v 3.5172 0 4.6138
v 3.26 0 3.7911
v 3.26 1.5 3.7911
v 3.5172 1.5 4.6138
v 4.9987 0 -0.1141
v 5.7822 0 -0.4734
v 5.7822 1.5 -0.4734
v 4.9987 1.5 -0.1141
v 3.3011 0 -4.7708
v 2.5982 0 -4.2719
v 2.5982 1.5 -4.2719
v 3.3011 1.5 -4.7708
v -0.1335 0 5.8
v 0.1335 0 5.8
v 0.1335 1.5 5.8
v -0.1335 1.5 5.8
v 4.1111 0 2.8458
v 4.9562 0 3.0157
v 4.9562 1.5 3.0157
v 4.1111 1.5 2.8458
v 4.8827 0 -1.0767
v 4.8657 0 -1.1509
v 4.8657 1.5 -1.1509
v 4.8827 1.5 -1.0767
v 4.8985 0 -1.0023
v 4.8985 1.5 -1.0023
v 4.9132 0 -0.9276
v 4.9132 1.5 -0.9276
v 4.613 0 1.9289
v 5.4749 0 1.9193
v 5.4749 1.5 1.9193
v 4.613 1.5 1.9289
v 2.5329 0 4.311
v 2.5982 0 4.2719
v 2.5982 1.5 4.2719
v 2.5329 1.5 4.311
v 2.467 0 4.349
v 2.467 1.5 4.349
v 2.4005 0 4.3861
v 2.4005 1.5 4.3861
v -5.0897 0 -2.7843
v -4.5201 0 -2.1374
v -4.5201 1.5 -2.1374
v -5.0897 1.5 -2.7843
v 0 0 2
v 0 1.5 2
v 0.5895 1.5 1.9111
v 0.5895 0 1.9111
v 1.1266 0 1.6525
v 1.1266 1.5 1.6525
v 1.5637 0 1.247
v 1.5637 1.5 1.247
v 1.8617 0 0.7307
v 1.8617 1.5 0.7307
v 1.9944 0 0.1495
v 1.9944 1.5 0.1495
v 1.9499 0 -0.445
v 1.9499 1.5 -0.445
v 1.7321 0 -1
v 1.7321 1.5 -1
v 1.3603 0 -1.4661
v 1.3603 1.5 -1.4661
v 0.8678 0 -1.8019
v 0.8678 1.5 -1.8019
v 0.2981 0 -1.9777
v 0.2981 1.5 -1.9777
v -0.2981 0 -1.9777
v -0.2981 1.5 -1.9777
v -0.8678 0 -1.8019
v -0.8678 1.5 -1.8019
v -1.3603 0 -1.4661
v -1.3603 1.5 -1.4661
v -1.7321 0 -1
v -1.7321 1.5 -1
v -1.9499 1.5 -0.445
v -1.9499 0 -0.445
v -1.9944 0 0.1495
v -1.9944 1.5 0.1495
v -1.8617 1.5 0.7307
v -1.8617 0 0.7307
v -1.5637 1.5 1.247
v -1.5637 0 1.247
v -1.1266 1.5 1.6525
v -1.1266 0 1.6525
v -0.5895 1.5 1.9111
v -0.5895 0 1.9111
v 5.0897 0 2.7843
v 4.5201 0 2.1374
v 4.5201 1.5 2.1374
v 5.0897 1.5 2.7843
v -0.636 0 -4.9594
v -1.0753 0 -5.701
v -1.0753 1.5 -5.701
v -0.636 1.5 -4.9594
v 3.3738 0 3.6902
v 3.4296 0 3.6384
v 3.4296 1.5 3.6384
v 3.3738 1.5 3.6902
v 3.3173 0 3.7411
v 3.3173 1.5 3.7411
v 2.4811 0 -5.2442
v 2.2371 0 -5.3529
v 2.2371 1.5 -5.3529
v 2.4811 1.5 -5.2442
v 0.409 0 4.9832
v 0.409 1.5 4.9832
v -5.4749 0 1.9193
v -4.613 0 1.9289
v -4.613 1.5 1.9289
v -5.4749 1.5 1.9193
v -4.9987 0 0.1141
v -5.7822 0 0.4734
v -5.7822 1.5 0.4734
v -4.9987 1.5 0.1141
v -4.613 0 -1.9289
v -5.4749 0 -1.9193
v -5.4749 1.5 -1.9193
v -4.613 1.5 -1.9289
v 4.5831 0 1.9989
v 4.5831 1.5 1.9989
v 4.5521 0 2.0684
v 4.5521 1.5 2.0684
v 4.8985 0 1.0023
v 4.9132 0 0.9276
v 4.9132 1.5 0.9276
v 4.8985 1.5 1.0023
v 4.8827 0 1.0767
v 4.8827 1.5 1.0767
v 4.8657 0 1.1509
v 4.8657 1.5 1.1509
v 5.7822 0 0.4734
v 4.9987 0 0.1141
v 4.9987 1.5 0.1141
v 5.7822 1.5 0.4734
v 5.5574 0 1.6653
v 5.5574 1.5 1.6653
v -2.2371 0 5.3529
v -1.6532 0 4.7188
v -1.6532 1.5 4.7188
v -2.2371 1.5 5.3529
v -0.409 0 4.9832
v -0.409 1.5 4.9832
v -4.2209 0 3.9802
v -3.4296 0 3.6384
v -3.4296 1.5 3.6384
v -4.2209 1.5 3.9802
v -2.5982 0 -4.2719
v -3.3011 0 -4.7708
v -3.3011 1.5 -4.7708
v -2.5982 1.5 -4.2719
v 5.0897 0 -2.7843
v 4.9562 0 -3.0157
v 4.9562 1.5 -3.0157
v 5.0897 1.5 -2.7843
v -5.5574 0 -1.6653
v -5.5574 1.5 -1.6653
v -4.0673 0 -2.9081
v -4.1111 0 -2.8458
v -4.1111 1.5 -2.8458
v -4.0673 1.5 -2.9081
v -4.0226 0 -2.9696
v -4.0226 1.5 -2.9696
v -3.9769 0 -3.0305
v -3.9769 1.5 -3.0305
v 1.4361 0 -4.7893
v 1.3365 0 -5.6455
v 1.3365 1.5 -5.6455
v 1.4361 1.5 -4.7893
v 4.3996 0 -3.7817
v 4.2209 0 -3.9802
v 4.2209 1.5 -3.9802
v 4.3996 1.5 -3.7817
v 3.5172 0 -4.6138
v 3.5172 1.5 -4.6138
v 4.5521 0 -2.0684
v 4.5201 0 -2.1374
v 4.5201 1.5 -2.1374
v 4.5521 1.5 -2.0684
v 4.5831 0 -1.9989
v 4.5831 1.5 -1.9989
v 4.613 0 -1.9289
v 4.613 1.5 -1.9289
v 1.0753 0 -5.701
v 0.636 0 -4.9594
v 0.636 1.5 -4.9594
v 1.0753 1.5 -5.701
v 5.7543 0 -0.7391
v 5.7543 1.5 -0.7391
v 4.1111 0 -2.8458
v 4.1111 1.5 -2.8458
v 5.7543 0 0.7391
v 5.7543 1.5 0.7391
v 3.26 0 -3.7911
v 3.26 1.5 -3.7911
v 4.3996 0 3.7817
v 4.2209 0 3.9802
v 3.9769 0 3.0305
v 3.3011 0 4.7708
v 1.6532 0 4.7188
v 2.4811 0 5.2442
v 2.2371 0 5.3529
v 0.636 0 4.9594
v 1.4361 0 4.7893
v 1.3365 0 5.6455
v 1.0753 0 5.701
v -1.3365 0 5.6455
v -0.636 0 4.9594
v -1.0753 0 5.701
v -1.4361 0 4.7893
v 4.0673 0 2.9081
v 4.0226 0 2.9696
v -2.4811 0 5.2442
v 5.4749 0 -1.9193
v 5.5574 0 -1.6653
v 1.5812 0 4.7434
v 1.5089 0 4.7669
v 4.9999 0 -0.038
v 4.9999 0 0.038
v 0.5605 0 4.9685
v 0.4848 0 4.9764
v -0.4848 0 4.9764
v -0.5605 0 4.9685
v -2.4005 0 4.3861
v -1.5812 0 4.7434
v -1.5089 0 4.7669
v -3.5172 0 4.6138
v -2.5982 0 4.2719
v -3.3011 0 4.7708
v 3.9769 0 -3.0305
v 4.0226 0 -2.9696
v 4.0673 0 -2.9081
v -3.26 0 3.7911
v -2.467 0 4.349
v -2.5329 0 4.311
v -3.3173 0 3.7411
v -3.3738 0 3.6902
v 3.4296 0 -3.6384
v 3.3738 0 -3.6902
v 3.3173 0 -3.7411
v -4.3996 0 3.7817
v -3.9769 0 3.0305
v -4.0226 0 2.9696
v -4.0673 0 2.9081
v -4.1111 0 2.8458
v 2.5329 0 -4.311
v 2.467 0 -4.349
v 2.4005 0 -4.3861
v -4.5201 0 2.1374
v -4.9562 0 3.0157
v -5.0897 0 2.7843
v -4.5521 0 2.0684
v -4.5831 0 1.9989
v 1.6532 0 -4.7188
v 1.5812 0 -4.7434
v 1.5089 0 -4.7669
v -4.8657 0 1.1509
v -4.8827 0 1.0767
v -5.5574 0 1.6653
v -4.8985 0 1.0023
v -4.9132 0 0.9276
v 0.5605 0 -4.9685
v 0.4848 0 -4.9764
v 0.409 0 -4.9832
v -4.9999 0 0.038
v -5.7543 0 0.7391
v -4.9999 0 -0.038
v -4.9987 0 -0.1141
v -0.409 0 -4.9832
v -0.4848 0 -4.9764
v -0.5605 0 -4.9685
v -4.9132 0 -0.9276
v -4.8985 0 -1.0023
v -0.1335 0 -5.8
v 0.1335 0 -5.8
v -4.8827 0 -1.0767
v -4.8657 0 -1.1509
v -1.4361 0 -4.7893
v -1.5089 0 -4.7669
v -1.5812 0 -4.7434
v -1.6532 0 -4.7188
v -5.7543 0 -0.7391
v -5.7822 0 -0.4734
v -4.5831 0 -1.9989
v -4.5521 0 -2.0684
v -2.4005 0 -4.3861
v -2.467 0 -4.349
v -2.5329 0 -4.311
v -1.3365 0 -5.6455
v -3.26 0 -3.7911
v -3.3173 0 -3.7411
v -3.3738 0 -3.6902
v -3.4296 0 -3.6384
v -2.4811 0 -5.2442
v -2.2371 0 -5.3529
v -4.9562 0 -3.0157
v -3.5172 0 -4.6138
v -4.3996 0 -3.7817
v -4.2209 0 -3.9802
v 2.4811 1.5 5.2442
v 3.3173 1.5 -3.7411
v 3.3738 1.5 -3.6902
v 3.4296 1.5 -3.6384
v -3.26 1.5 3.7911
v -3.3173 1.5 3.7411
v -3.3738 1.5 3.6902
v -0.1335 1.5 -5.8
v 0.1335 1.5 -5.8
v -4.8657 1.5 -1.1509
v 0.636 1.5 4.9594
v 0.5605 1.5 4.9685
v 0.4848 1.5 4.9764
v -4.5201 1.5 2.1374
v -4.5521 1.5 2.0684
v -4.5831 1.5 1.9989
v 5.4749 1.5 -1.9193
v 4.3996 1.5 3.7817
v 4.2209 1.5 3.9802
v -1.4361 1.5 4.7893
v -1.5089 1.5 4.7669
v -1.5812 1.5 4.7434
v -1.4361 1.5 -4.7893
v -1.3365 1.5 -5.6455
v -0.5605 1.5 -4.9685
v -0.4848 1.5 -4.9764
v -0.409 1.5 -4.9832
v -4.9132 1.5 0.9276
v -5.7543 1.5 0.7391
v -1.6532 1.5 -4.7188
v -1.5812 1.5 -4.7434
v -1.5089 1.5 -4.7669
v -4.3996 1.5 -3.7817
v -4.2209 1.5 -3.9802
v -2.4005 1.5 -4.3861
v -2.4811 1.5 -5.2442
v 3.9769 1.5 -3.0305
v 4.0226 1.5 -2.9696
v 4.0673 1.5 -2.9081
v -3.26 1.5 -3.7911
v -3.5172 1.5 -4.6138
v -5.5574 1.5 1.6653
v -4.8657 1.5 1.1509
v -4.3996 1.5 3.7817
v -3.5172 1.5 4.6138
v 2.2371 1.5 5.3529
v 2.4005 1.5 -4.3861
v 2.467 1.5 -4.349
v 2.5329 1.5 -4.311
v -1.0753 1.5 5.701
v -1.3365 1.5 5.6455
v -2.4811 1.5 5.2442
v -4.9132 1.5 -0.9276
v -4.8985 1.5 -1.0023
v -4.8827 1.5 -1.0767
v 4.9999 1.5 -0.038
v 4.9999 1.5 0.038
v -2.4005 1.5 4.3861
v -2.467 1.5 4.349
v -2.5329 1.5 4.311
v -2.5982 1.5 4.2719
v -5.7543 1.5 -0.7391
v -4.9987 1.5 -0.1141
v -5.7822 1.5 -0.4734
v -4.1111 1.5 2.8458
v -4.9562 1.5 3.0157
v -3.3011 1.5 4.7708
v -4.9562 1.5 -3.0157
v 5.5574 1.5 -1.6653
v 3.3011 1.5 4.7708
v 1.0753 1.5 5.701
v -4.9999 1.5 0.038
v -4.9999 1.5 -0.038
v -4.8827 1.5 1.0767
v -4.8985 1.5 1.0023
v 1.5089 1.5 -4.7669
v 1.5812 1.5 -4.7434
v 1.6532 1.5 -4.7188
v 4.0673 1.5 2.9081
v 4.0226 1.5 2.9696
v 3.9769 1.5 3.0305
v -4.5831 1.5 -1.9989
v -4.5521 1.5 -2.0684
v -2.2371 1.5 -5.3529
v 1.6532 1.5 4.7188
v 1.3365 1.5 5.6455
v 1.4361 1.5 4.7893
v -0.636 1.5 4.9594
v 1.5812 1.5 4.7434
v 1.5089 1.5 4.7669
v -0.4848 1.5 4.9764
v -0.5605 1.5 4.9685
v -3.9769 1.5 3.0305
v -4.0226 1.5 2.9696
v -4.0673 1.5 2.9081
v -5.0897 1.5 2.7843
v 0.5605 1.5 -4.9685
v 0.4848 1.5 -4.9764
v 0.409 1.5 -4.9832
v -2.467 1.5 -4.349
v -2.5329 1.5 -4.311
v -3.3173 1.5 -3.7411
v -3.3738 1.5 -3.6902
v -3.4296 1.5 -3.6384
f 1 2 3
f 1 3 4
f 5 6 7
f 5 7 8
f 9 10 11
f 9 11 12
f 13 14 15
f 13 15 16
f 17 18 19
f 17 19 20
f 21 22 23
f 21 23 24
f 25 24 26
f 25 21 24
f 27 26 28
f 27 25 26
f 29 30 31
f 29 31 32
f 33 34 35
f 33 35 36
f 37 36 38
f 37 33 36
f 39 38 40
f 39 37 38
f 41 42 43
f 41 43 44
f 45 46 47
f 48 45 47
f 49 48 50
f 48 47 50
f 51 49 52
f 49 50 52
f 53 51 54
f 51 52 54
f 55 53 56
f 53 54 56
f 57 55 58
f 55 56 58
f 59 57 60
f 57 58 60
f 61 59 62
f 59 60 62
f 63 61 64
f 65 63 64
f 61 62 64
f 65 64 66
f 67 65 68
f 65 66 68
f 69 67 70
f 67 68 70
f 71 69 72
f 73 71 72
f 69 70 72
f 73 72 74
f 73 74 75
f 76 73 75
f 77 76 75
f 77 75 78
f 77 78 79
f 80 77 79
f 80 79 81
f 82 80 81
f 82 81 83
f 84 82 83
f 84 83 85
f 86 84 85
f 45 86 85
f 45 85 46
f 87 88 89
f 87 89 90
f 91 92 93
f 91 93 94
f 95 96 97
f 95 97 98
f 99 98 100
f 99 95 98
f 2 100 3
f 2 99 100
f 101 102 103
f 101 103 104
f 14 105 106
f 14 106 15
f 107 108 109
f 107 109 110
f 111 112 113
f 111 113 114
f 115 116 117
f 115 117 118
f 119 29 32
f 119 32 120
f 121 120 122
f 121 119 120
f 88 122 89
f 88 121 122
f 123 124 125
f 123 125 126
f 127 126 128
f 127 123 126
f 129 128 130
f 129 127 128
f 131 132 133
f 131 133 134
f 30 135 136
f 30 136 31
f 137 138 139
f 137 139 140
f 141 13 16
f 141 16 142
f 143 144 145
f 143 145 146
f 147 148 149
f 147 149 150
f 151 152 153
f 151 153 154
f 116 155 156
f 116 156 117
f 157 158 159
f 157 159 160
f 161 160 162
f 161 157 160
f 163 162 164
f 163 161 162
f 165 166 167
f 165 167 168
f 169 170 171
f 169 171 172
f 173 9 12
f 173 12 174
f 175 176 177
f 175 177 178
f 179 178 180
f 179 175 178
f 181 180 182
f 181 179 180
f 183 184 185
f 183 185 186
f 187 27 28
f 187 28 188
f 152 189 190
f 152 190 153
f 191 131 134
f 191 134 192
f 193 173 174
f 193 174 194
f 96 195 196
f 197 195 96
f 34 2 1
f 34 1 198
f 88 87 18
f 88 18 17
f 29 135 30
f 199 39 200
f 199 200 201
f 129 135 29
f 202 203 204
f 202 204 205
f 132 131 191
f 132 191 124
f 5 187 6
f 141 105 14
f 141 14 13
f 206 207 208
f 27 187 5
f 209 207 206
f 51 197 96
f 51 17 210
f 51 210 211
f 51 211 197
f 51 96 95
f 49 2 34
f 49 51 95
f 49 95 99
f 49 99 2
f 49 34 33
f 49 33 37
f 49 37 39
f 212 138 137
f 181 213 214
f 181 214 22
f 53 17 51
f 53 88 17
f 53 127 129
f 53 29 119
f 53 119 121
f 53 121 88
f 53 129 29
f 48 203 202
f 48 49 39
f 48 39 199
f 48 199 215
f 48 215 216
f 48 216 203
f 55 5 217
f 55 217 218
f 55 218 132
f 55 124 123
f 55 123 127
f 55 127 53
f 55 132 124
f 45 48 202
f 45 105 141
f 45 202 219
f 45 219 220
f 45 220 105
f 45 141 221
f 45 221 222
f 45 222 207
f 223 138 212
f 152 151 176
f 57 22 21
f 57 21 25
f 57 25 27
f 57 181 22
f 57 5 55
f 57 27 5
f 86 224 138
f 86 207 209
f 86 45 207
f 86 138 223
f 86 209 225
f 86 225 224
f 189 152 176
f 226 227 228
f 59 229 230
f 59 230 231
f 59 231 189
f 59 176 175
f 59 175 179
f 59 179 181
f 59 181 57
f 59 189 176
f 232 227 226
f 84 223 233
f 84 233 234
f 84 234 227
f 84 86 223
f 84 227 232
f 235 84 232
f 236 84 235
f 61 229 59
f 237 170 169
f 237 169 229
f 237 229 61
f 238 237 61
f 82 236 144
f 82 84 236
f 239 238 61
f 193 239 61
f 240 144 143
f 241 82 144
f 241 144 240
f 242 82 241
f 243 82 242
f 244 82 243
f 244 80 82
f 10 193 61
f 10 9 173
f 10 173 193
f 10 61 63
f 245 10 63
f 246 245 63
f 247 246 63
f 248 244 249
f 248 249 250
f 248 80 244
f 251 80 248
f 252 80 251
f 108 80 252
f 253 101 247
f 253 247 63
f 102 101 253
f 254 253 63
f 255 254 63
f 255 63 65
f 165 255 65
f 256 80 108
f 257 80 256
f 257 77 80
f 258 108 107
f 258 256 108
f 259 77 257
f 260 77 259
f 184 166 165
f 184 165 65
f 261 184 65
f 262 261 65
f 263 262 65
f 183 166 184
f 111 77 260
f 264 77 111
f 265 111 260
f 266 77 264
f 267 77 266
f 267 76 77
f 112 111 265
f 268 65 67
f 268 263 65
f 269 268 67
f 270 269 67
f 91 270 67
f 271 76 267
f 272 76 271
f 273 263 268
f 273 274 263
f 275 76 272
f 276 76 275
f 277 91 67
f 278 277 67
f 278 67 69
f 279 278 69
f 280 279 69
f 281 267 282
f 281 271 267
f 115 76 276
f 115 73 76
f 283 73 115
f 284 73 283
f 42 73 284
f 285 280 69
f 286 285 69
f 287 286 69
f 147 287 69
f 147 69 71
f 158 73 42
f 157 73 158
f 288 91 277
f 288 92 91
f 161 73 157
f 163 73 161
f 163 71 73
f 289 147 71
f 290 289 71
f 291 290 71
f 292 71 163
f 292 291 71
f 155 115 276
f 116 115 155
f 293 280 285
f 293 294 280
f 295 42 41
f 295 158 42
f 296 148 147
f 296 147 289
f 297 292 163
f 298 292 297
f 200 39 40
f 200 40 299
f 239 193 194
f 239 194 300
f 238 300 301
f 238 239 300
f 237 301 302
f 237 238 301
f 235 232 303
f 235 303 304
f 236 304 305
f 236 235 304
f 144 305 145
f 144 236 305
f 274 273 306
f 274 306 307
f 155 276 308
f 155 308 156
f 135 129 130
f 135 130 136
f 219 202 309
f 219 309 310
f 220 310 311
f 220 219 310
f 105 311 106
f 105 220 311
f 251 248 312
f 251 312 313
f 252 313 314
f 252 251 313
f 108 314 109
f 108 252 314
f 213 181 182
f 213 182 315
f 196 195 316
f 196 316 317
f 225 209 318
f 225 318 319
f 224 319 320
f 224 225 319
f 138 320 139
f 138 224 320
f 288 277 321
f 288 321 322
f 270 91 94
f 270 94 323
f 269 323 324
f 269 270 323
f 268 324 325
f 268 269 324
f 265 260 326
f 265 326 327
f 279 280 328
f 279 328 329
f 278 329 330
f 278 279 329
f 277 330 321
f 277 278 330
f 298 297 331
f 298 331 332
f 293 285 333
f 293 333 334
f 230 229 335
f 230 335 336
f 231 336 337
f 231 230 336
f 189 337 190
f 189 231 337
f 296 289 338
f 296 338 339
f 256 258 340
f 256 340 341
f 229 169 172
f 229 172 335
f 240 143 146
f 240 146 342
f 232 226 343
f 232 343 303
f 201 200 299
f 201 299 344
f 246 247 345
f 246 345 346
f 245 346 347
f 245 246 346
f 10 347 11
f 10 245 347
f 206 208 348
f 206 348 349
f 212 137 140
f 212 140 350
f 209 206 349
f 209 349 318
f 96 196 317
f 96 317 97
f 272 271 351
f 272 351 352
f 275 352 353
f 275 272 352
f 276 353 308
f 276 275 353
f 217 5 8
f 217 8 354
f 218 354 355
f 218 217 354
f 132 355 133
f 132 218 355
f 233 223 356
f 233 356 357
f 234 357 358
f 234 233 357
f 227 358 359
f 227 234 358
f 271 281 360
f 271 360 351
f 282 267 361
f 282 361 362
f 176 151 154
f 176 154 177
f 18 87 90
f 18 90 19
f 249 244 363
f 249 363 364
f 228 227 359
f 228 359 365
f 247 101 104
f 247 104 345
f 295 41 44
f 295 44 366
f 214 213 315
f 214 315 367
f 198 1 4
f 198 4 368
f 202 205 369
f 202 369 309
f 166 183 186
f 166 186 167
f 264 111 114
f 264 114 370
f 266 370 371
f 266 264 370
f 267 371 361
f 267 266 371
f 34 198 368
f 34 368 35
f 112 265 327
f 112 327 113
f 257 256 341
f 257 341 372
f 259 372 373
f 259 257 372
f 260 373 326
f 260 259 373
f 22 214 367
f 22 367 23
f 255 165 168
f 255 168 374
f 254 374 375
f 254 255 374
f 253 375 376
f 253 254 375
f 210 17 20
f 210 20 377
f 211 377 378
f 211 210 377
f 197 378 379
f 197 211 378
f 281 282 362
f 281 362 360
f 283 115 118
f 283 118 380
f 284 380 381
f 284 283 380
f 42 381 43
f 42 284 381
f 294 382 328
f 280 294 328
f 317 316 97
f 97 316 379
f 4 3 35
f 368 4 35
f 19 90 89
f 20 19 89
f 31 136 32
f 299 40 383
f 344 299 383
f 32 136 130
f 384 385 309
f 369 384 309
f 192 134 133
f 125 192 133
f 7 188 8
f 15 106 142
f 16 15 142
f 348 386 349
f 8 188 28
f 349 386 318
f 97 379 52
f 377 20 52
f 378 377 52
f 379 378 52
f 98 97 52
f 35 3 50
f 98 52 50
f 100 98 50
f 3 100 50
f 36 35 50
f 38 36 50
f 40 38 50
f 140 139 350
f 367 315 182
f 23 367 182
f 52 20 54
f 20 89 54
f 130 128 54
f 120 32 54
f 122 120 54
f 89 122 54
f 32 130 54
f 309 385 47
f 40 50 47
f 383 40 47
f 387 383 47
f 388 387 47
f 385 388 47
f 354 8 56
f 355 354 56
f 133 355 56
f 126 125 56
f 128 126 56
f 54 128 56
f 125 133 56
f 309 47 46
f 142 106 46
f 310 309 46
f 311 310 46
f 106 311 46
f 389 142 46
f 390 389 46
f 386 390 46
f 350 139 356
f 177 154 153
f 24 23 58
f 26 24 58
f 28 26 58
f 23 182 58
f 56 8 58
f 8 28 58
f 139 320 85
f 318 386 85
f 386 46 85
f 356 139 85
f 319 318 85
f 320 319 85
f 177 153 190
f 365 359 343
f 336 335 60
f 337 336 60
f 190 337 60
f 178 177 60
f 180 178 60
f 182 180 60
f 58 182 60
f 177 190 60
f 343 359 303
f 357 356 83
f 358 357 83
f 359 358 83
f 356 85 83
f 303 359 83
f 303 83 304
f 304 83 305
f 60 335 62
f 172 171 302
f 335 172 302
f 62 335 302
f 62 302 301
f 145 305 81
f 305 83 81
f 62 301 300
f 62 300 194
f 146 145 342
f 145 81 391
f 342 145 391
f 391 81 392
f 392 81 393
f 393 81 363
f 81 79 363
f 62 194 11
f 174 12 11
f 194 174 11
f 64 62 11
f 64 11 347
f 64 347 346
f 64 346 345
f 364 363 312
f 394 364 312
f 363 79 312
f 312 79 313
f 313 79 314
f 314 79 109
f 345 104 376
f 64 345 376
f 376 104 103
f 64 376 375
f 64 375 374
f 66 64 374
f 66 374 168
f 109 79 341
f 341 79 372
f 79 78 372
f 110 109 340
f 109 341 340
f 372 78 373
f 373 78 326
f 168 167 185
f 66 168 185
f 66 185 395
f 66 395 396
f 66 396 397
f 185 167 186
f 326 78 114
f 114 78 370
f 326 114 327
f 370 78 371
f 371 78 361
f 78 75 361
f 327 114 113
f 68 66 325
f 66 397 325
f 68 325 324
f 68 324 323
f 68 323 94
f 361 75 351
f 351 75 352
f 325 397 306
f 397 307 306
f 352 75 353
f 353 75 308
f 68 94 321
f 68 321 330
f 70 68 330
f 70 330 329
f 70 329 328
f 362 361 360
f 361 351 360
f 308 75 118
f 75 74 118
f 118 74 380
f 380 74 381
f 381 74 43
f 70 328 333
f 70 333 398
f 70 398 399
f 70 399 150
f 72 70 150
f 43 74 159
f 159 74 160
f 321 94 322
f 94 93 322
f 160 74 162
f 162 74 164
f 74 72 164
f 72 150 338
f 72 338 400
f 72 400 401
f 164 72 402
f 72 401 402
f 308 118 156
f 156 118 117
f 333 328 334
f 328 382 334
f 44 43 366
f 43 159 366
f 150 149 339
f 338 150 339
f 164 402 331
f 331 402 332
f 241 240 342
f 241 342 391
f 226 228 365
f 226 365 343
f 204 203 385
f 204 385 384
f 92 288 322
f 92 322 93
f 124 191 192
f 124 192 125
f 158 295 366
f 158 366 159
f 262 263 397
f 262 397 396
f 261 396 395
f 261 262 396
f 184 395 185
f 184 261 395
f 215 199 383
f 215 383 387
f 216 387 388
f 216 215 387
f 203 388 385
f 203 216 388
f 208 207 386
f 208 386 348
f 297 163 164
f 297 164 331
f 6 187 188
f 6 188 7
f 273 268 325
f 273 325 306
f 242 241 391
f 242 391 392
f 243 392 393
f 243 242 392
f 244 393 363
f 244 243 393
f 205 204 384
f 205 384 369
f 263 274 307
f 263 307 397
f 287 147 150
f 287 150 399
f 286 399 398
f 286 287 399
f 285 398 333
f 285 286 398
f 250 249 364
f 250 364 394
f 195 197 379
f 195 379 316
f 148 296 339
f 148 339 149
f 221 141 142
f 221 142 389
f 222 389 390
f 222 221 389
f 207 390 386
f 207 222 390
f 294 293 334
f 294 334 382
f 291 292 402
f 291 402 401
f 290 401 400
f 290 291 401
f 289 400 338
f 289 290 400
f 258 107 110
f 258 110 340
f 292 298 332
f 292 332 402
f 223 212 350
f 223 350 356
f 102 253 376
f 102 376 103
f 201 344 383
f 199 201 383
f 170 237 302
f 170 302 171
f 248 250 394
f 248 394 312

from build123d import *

# Parameters (mm, degrees)
BOSS_EXTRUDE1_DEPTH = 1.5
SKETCH2_R           = 2
CUT_EXTRUDE1_DEPTH  = 9.326084366


with BuildPart() as part:
    # Sketch1 → Boss-Extrude1 (new body)
    with BuildSketch(Plane(origin=(0, 0, 0), x_dir=(1, 0, 0), z_dir=(0, 1, 0))):
        with BuildLine():
            Line((-0.133547548, 5.8), (0.133547548, 5.8))
            Line((0.133547548, 5.8), (0.408993174, 4.983244383))
            ThreePointArc((0.408993174, 4.983244383), (0.522642316, 4.972609477), (0.636019074, 4.959383))
            Line((0.636019074, 4.959383), (1.075258593, 5.701022181))
            Line((1.075258593, 5.701022181), (1.33651702, 5.645489988))
            Line((1.33651702, 5.645489988), (1.436130457, 4.789314075))
            ThreePointArc((1.436130457, 4.789314075), (1.545084972, 4.755282581), (1.653234236, 4.718772781))
            Line((1.653234236, 4.718772781), (2.237070774, 5.352882336))
            Line((2.237070774, 5.352882336), (2.481074286, 5.244244973))
            Line((2.481074286, 5.244244973), (2.400501948, 4.38606776))
            ThreePointArc((2.400501948, 4.38606776), (2.5, 4.330127019), (2.598195129, 4.271929549))
            Line((2.598195129, 4.271929549), (3.301112228, 4.770795846))
            Line((3.301112228, 4.770795846), (3.517196699, 4.613801288))
            Line((3.517196699, 4.613801288), (3.259959985, 3.791129237))
            ThreePointArc((3.259959985, 3.791129237), (3.345653032, 3.715724127), (3.429602427, 3.638382497))
            Line((3.429602427, 3.638382497), (4.220879236, 3.980202686))
            Line((4.220879236, 3.980202686), (4.399600739, 3.781712348))
            Line((4.399600739, 3.781712348), (3.976942128, 3.030500175))
            ThreePointArc((3.976942128, 3.030500175), (4.045084972, 2.938926261), (4.111119642, 2.84582067))
            Line((4.111119642, 2.84582067), (4.956173568, 3.015655569))
            Line((4.956173568, 3.015655569), (5.089721116, 2.784344431))
            Line((5.089721116, 2.784344431), (4.520112816, 2.137423713))
            ThreePointArc((4.520112816, 2.137423713), (4.567727288, 2.033683215), (4.612961202, 1.928882825))
            Line((4.612961202, 1.928882825), (5.474859333, 1.919309833))
            Line((5.474859333, 1.919309833), (5.557396256, 1.665287302))
            Line((5.557396256, 1.665287302), (4.865732884, 1.150931578))
            ThreePointArc((4.865732884, 1.150931578), (4.890738004, 1.039558454), (4.913194221, 0.927643544))
            Line((4.913194221, 0.927643544), (5.754267473, 0.739081047))
            Line((5.754267473, 0.739081047), (5.782186513, 0.473449127))
            Line((5.782186513, 0.473449127), (4.998697077, 0.114138211))
            ThreePointArc((4.998697077, 0.114138211), (5, 0), (4.998697077, -0.114138211))
            Line((4.998697077, -0.114138211), (5.782186513, -0.473449127))
            Line((5.782186513, -0.473449127), (5.754267473, -0.739081047))
            Line((5.754267473, -0.739081047), (4.913194221, -0.927643544))
            ThreePointArc((4.913194221, -0.927643544), (4.890738004, -1.039558454), (4.865732884, -1.150931578))
            Line((4.865732884, -1.150931578), (5.557396256, -1.665287302))
            Line((5.557396256, -1.665287302), (5.474859333, -1.919309833))
            Line((5.474859333, -1.919309833), (4.612961202, -1.928882825))
            ThreePointArc((4.612961202, -1.928882825), (4.567727288, -2.033683215), (4.520112816, -2.137423713))
            Line((4.520112816, -2.137423713), (5.089721116, -2.784344431))
            Line((5.089721116, -2.784344431), (4.956173568, -3.015655569))
            Line((4.956173568, -3.015655569), (4.111119642, -2.84582067))
            ThreePointArc((4.111119642, -2.84582067), (4.045084972, -2.938926261), (3.976942128, -3.030500175))
            Line((3.976942128, -3.030500175), (4.399600739, -3.781712348))
            Line((4.399600739, -3.781712348), (4.220879236, -3.980202686))
            Line((4.220879236, -3.980202686), (3.429602427, -3.638382497))
            ThreePointArc((3.429602427, -3.638382497), (3.345653032, -3.715724127), (3.259959985, -3.791129237))
            Line((3.259959985, -3.791129237), (3.517196699, -4.613801288))
            Line((3.517196699, -4.613801288), (3.301112228, -4.770795846))
            Line((3.301112228, -4.770795846), (2.598195129, -4.271929549))
            ThreePointArc((2.598195129, -4.271929549), (2.5, -4.330127019), (2.400501948, -4.38606776))
            Line((2.400501948, -4.38606776), (2.481074286, -5.244244973))
            Line((2.481074286, -5.244244973), (2.237070774, -5.352882336))
            Line((2.237070774, -5.352882336), (1.653234236, -4.718772781))
            ThreePointArc((1.653234236, -4.718772781), (1.545084972, -4.755282581), (1.436130457, -4.789314075))
            Line((1.436130457, -4.789314075), (1.33651702, -5.645489988))
            Line((1.33651702, -5.645489988), (1.075258593, -5.701022181))
            Line((1.075258593, -5.701022181), (0.636019074, -4.959383))
            ThreePointArc((0.636019074, -4.959383), (0.522642316, -4.972609477), (0.408993174, -4.983244383))
            Line((0.408993174, -4.983244383), (0.133547548, -5.8))
            Line((0.133547548, -5.8), (-0.133547548, -5.8))
            Line((-0.133547548, -5.8), (-0.408993174, -4.983244383))
            ThreePointArc((-0.408993174, -4.983244383), (-0.522642316, -4.972609477), (-0.636019074, -4.959383))
            Line((-0.636019074, -4.959383), (-1.075258593, -5.701022181))
            Line((-1.075258593, -5.701022181), (-1.33651702, -5.645489988))
            Line((-1.33651702, -5.645489988), (-1.436130457, -4.789314075))
            ThreePointArc((-1.436130457, -4.789314075), (-1.545084972, -4.755282581), (-1.653234236, -4.718772781))
            Line((-1.653234236, -4.718772781), (-2.237070774, -5.352882336))
            Line((-2.237070774, -5.352882336), (-2.481074286, -5.244244973))
            Line((-2.481074286, -5.244244973), (-2.400501948, -4.38606776))
            ThreePointArc((-2.400501948, -4.38606776), (-2.5, -4.330127019), (-2.598195129, -4.271929549))
            Line((-2.598195129, -4.271929549), (-3.301112228, -4.770795846))
            Line((-3.301112228, -4.770795846), (-3.517196699, -4.613801288))
            Line((-3.517196699, -4.613801288), (-3.259959985, -3.791129237))
            ThreePointArc((-3.259959985, -3.791129237), (-3.345653032, -3.715724127), (-3.429602427, -3.638382497))
            Line((-3.429602427, -3.638382497), (-4.220879236, -3.980202686))
            Line((-4.220879236, -3.980202686), (-4.399600739, -3.781712348))
            Line((-4.399600739, -3.781712348), (-3.976942128, -3.030500175))
            ThreePointArc((-3.976942128, -3.030500175), (-4.045084972, -2.938926261), (-4.111119642, -2.84582067))
            Line((-4.111119642, -2.84582067), (-4.956173568, -3.015655569))
            Line((-4.956173568, -3.015655569), (-5.089721116, -2.784344431))
            Line((-5.089721116, -2.784344431), (-4.520112816, -2.137423713))
            ThreePointArc((-4.520112816, -2.137423713), (-4.567727288, -2.033683215), (-4.612961202, -1.928882825))
            Line((-4.612961202, -1.928882825), (-5.474859333, -1.919309833))
            Line((-5.474859333, -1.919309833), (-5.557396256, -1.665287302))
            Line((-5.557396256, -1.665287302), (-4.865732884, -1.150931578))
            ThreePointArc((-4.865732884, -1.150931578), (-4.890738004, -1.039558454), (-4.913194221, -0.927643544))
            Line((-4.913194221, -0.927643544), (-5.754267473, -0.739081047))
            Line((-5.754267473, -0.739081047), (-5.782186513, -0.473449127))
            Line((-5.782186513, -0.473449127), (-4.998697077, -0.114138211))
            ThreePointArc((-4.998697077, -0.114138211), (-5, 0), (-4.998697077, 0.114138211))
            Line((-4.998697077, 0.114138211), (-5.782186513, 0.473449127))
            Line((-5.782186513, 0.473449127), (-5.754267473, 0.739081047))
            Line((-5.754267473, 0.739081047), (-4.913194221, 0.927643544))
            ThreePointArc((-4.913194221, 0.927643544), (-4.890738004, 1.039558454), (-4.865732884, 1.150931578))
            Line((-4.865732884, 1.150931578), (-5.557396256, 1.665287302))
            Line((-5.557396256, 1.665287302), (-5.474859333, 1.919309833))
            Line((-5.474859333, 1.919309833), (-4.612961202, 1.928882825))
            ThreePointArc((-4.612961202, 1.928882825), (-4.567727288, 2.033683215), (-4.520112816, 2.137423713))
            Line((-4.520112816, 2.137423713), (-5.089721116, 2.784344431))
            Line((-5.089721116, 2.784344431), (-4.956173568, 3.015655569))
            Line((-4.956173568, 3.015655569), (-4.111119642, 2.84582067))
            ThreePointArc((-4.111119642, 2.84582067), (-4.045084972, 2.938926261), (-3.976942128, 3.030500175))
            Line((-3.976942128, 3.030500175), (-4.399600739, 3.781712348))
            Line((-4.399600739, 3.781712348), (-4.220879236, 3.980202686))
            Line((-4.220879236, 3.980202686), (-3.429602427, 3.638382497))
            ThreePointArc((-3.429602427, 3.638382497), (-3.345653032, 3.715724127), (-3.259959985, 3.791129237))
            Line((-3.259959985, 3.791129237), (-3.517196699, 4.613801288))
            Line((-3.517196699, 4.613801288), (-3.301112228, 4.770795846))
            Line((-3.301112228, 4.770795846), (-2.598195129, 4.271929549))
            ThreePointArc((-2.598195129, 4.271929549), (-2.5, 4.330127019), (-2.400501948, 4.38606776))
            Line((-2.400501948, 4.38606776), (-2.481074286, 5.244244973))
            Line((-2.481074286, 5.244244973), (-2.237070774, 5.352882336))
            Line((-2.237070774, 5.352882336), (-1.653234236, 4.718772781))
            ThreePointArc((-1.653234236, 4.718772781), (-1.545084972, 4.755282581), (-1.436130457, 4.789314075))
            Line((-1.436130457, 4.789314075), (-1.33651702, 5.645489988))
            Line((-1.33651702, 5.645489988), (-1.075258593, 5.701022181))
            Line((-1.075258593, 5.701022181), (-0.636019074, 4.959383))
            ThreePointArc((-0.636019074, 4.959383), (-0.522642316, 4.972609477), (-0.408993174, 4.983244383))
            Line((-0.408993174, 4.983244383), (-0.133547548, 5.8))
        make_face()
    extrude(amount=BOSS_EXTRUDE1_DEPTH)

    # Sketch2 → Cut-Extrude1 (cut, through all)
    with BuildSketch(Plane(origin=(0, 1.5, 0), x_dir=(1, 0, 0), z_dir=(0, 1, 0))):
        with Locations(Location((0, 0, 0), (0, 0, 270))):
            Circle(SKETCH2_R)
    extrude(amount=-CUT_EXTRUDE1_DEPTH, mode=Mode.SUBTRACT)


solid = part.part
